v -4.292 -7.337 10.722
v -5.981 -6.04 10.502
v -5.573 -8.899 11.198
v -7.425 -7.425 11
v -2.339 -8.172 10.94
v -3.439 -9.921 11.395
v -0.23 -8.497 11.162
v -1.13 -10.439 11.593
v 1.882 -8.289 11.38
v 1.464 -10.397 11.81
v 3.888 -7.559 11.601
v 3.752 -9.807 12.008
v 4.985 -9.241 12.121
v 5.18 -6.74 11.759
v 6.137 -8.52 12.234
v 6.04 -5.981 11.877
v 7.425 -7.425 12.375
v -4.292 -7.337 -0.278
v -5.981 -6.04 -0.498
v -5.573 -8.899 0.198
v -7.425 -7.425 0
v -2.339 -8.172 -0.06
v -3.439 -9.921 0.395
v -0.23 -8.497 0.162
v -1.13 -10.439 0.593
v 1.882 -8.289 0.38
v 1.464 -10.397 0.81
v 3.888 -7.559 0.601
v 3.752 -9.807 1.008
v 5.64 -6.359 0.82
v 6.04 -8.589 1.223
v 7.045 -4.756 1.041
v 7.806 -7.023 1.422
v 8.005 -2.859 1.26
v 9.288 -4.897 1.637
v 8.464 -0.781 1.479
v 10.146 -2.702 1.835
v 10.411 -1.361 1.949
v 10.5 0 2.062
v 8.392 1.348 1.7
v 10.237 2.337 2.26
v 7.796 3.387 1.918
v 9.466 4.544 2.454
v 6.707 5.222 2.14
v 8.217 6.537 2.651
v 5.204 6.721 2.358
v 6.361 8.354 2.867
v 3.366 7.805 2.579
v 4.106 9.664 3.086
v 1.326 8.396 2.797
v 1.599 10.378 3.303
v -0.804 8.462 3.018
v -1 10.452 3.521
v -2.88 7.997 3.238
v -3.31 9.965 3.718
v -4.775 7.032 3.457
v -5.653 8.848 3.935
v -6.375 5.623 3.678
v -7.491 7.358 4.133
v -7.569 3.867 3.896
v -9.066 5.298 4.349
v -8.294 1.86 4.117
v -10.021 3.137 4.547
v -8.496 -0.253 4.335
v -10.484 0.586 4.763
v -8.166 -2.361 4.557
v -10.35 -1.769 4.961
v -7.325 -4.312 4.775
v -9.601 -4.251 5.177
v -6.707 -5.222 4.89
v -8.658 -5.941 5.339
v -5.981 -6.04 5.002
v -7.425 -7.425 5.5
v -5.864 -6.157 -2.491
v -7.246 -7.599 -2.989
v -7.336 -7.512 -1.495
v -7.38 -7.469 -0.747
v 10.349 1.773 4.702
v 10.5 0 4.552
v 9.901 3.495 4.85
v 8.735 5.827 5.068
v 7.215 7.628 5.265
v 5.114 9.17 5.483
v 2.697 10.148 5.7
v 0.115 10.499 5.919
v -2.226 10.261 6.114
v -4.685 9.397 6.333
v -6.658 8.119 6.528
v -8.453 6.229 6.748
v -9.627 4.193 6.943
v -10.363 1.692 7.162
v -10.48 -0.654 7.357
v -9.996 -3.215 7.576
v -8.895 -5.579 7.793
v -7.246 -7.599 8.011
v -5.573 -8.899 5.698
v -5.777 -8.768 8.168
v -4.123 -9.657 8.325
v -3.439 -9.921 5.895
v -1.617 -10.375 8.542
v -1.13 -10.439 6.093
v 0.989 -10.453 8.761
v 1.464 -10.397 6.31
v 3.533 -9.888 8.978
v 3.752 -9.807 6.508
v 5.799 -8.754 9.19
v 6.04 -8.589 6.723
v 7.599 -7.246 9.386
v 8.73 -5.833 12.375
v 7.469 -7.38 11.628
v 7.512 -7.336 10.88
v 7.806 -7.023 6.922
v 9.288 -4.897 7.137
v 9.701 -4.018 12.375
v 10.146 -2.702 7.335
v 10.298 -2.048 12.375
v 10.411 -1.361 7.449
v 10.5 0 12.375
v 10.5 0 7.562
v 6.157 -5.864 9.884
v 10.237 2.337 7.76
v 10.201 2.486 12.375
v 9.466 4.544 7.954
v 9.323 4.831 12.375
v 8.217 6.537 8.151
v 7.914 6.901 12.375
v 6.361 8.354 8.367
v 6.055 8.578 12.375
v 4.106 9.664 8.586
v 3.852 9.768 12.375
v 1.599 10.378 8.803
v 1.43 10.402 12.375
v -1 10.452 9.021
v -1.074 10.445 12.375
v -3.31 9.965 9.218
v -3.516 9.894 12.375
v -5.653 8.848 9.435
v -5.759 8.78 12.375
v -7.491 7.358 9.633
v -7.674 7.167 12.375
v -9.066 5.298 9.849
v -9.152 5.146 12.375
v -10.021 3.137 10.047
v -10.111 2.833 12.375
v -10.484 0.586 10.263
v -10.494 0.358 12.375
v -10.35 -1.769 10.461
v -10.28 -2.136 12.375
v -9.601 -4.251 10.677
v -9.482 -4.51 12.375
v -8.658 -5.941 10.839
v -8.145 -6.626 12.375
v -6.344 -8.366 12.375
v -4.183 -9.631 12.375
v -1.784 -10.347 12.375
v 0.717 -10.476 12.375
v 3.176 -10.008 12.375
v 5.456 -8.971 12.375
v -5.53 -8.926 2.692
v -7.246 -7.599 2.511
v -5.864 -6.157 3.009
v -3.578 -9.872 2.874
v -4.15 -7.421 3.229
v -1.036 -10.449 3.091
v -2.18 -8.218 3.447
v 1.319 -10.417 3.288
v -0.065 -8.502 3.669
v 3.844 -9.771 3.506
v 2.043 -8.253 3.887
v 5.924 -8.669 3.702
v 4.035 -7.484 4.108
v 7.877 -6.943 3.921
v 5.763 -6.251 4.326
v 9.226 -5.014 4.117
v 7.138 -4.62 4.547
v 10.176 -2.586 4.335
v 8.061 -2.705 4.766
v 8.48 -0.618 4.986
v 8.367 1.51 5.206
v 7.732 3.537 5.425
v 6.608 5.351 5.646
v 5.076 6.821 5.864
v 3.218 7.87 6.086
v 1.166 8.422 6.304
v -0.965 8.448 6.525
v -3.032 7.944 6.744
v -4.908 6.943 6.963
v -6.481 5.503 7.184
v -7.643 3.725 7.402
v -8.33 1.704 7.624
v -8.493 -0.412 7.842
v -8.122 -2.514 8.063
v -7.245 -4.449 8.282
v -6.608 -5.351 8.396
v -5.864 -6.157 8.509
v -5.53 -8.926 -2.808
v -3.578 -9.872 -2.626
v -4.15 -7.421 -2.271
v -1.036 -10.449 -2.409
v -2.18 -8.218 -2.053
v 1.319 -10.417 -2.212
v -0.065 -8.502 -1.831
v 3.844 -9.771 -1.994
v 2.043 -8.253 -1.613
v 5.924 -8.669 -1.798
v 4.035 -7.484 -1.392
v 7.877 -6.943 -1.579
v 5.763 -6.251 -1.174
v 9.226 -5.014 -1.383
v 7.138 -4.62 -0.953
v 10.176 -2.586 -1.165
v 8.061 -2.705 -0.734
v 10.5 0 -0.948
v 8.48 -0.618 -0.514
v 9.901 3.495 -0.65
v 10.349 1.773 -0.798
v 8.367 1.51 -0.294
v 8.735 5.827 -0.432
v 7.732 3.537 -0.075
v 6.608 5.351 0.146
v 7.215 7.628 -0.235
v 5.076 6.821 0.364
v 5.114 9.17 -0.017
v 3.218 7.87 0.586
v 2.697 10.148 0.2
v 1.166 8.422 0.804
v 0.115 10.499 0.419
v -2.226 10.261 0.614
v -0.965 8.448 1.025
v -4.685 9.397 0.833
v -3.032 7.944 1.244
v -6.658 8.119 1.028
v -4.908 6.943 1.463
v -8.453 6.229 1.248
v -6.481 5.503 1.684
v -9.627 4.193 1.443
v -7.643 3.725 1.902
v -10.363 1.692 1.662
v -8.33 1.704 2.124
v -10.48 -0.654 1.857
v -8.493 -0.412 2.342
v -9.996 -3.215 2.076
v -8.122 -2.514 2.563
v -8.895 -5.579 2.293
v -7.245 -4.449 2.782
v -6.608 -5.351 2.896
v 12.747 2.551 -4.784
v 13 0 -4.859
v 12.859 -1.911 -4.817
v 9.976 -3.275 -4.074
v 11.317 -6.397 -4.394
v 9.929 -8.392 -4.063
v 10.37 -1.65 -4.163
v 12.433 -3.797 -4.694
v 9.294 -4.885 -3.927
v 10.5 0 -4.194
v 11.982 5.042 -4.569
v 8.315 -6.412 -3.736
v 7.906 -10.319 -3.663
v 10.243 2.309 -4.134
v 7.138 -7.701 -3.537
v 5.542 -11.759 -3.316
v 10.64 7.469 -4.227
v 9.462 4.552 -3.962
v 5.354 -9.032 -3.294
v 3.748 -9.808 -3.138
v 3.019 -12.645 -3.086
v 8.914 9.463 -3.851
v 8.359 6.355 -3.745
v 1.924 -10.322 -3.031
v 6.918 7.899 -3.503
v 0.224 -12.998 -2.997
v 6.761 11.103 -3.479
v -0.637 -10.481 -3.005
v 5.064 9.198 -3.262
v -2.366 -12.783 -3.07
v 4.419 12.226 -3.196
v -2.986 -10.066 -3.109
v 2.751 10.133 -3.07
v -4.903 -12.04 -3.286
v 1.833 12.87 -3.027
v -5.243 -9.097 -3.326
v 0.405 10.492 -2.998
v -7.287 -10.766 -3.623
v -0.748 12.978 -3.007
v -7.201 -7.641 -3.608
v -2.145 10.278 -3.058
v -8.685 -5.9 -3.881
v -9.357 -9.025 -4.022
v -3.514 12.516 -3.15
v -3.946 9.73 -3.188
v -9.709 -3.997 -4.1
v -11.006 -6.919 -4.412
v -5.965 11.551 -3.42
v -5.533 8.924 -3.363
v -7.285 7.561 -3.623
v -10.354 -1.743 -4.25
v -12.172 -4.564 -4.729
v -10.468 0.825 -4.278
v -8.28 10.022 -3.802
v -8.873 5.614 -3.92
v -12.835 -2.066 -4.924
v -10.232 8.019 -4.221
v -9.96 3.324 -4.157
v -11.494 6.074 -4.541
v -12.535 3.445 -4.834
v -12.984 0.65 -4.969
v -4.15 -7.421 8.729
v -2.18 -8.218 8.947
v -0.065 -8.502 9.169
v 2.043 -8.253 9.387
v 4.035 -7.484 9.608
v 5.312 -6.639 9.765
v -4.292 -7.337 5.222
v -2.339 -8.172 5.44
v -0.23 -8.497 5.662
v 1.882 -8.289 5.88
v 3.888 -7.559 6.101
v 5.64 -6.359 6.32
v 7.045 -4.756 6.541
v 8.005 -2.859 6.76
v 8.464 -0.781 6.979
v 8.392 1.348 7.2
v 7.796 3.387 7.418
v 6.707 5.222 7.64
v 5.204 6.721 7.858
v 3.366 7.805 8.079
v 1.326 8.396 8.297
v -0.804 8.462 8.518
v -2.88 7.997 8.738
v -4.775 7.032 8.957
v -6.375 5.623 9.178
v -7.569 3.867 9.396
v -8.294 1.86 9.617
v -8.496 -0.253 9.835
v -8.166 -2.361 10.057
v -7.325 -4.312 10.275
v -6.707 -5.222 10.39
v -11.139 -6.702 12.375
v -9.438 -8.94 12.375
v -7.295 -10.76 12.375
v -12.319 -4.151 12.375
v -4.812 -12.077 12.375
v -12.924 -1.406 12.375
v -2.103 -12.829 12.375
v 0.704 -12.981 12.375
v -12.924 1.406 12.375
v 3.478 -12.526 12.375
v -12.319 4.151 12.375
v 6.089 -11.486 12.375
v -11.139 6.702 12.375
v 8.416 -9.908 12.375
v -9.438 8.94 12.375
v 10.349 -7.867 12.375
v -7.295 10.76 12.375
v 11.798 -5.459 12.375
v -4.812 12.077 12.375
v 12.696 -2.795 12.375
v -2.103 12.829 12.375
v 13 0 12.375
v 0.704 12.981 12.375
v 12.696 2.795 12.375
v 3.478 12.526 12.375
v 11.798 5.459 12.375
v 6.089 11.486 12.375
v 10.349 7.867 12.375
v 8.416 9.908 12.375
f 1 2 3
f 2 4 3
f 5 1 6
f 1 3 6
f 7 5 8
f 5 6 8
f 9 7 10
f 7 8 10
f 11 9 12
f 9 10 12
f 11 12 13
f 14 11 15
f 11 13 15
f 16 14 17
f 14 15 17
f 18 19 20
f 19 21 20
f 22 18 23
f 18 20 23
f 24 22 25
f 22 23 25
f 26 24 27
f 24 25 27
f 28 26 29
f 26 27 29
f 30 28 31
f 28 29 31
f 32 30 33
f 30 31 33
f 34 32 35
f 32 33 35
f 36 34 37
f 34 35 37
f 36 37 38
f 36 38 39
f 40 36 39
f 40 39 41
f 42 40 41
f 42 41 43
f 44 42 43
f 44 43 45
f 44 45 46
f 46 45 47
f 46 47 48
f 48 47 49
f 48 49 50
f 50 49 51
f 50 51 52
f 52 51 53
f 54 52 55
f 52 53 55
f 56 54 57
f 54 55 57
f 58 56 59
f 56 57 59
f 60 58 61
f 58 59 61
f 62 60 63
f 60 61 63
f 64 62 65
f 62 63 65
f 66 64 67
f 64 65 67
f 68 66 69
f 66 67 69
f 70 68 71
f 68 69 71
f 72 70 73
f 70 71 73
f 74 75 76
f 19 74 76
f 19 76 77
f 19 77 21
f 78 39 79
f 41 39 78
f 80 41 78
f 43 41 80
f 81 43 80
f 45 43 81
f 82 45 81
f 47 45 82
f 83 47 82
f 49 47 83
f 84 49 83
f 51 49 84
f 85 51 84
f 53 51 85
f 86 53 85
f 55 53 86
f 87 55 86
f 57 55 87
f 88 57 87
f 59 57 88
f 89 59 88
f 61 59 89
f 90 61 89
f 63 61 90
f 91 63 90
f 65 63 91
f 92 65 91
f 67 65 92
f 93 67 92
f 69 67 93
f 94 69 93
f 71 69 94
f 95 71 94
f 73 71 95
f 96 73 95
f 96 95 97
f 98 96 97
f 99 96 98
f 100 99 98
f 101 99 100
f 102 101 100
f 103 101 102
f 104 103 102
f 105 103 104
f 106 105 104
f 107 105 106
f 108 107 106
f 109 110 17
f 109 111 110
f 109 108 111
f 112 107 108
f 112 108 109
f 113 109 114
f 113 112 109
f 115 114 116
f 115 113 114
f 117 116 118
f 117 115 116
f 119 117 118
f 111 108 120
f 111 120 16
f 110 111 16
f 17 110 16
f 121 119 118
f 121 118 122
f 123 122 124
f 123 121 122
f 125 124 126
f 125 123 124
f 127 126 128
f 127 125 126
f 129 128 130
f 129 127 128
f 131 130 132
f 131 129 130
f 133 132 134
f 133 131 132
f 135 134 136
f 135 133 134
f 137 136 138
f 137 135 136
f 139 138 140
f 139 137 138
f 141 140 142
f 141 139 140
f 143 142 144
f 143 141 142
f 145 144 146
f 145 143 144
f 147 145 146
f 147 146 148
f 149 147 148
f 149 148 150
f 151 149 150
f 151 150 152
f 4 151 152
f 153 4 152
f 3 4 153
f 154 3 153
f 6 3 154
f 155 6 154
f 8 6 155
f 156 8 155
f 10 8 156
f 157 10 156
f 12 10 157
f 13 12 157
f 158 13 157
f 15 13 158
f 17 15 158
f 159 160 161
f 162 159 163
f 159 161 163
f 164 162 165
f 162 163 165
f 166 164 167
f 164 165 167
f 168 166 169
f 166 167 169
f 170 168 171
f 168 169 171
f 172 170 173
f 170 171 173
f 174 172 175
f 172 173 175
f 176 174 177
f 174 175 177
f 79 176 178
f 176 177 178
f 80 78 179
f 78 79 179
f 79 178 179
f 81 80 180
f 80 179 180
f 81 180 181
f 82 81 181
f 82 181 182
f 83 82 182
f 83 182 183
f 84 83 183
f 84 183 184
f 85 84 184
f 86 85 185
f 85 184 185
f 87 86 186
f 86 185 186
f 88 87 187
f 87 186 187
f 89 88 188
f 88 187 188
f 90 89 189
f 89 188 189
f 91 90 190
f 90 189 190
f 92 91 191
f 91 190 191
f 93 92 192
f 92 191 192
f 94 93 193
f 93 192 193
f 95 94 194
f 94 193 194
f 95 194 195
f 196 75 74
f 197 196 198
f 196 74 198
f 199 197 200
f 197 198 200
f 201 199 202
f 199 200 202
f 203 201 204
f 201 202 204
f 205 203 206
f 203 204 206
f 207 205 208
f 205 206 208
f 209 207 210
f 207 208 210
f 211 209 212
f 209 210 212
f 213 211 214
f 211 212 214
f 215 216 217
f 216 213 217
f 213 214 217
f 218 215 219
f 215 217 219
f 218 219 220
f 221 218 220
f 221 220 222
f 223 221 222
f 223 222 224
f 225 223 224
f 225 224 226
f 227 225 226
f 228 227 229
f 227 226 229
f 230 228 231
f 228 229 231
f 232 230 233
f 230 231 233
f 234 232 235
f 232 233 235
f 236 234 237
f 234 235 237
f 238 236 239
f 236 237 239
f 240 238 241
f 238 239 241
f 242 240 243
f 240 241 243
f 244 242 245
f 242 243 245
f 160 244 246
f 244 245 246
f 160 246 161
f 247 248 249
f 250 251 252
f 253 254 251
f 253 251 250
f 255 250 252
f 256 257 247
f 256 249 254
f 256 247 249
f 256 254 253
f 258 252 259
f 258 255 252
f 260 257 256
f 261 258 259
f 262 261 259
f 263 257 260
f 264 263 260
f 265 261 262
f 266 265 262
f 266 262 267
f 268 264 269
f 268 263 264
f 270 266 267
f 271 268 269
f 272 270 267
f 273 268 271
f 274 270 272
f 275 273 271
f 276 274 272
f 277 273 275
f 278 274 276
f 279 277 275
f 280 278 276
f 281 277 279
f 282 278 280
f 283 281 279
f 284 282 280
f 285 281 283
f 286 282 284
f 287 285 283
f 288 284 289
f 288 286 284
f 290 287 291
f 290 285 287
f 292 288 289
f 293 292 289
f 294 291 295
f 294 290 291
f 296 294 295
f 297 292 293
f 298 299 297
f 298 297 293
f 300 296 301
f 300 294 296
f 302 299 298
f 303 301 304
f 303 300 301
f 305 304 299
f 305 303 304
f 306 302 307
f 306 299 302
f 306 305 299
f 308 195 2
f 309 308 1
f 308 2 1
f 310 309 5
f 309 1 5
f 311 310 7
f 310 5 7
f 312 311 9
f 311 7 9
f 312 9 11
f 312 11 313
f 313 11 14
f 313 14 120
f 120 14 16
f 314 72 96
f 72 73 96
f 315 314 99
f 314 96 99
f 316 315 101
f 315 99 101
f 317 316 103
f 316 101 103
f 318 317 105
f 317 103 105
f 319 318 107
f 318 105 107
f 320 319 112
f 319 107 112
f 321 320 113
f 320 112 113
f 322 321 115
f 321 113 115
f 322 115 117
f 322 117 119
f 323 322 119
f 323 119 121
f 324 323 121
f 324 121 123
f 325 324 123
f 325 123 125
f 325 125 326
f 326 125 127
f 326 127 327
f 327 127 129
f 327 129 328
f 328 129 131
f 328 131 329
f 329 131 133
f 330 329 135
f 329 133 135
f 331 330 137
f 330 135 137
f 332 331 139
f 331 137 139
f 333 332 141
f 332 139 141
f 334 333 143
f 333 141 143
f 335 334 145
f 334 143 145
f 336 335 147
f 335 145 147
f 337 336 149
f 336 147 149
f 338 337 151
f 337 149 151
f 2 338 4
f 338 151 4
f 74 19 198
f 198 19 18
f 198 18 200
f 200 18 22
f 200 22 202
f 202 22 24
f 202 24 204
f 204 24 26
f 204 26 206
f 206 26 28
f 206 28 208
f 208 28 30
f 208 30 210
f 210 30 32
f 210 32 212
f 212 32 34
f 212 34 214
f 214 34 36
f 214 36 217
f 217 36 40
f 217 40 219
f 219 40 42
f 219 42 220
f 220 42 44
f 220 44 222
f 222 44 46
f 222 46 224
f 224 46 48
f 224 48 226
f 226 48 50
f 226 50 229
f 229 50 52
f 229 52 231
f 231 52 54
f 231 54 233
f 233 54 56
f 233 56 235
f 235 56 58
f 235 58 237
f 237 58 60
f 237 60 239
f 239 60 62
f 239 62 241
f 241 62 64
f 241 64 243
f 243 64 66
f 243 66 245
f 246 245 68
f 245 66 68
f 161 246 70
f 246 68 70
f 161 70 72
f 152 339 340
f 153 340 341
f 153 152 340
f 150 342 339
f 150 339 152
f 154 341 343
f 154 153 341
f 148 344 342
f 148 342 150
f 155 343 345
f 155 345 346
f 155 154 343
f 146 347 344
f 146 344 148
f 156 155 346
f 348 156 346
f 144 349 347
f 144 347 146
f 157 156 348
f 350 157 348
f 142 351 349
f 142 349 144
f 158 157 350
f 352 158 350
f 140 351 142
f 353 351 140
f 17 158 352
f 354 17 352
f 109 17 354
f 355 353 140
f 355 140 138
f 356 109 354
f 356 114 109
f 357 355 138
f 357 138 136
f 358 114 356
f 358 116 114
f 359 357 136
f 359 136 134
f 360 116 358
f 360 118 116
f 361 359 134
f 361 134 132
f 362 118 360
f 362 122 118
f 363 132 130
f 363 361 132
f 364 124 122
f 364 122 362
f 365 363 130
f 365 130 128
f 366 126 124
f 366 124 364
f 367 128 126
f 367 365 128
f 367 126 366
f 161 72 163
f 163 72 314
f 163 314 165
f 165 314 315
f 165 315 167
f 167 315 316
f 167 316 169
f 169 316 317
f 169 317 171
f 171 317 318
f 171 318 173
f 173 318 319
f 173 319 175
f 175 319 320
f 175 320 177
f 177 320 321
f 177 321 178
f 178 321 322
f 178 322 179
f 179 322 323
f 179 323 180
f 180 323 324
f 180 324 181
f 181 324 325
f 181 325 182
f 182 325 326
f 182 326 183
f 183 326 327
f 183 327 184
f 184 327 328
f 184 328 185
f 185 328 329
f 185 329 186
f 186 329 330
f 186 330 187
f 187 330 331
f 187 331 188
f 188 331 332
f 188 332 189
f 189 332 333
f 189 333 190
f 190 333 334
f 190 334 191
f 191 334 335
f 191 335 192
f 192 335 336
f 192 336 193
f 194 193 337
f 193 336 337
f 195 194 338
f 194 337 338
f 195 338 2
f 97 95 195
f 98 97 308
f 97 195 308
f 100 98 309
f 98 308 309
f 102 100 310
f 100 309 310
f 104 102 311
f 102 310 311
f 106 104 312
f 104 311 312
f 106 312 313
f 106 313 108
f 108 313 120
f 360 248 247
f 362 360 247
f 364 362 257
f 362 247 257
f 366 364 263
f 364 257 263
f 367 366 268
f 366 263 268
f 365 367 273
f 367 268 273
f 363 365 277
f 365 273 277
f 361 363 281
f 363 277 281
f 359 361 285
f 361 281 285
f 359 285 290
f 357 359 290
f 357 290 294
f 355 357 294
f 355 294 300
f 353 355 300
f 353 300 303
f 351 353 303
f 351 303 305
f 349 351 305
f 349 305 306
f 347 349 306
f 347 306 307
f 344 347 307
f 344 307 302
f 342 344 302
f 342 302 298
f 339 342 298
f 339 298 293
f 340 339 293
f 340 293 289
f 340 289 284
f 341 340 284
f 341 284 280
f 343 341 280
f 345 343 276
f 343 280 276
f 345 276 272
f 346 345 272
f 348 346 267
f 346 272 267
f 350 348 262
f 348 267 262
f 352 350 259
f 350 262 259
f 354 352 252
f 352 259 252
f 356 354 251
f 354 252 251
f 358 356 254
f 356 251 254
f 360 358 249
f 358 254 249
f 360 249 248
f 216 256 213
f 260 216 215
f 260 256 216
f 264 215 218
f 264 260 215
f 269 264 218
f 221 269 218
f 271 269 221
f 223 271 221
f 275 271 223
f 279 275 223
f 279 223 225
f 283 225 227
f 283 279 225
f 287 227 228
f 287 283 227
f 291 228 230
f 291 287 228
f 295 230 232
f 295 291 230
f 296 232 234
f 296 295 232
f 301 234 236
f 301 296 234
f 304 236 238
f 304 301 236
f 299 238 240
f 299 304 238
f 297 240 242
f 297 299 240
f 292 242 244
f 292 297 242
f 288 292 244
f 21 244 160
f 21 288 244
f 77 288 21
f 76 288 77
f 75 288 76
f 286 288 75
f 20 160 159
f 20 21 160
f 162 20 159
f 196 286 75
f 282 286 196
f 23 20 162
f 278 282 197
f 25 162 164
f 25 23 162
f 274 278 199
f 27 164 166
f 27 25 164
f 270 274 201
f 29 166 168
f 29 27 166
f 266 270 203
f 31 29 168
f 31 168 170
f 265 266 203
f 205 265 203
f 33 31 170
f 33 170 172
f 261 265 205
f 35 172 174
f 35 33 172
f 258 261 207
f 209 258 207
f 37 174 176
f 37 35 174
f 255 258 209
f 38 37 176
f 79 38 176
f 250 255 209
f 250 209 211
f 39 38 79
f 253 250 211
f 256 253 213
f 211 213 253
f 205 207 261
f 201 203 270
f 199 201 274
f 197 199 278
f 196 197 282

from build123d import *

# Parameters (mm, degrees)
EXTRUDE_1_DEPTH          = 12.375
EXTRUDE_1_DEPTH_BACK     = 13
SKETCH_1_R               = 13
CUT_EXTRUDE_1_DEPTH      = 20
CUT_EXTRUDE_1_DEPTH_BACK = 10
SKETCH_2_R               = 10.5
SWEEP_1_PITCH            = 5.5
CUT_EXTRUDE_2_DEPTH      = 20
CUT_EXTRUDE_2_DEPTH_BACK = 20
SKETCH_6_R               = 45.002821291


with BuildPart() as part:
    # 草图1 → 凸台-拉伸1 (new, two sides: drawn at the far end of the back side and taken through both)
    with BuildSketch(Plane.XY.offset(-EXTRUDE_1_DEPTH_BACK)):
        Circle(SKETCH_1_R)
    extrude(amount=EXTRUDE_1_DEPTH + EXTRUDE_1_DEPTH_BACK)

    # 草图2 → 切除-拉伸1 (cut, two sides: drawn at the far end of the back side and taken through both)
    with BuildSketch(Plane.XY.offset(-CUT_EXTRUDE_1_DEPTH_BACK)):
        Circle(SKETCH_2_R)
    extrude(amount=CUT_EXTRUDE_1_DEPTH + CUT_EXTRUDE_1_DEPTH_BACK, mode=Mode.SUBTRACT)

    # 扫描1: the profile of 草图4 screwed along a right-hand helix of 2.25 turns, 14 arcs to a turn; built about Z, then put on its axis
    sweep_1_z = Axis((0, 0, 0), (0, 0, 1))
    sweep_1_corners = [(10.5, 0, 0), (10.5, 0.249236025, -2.989628974), (8.5, 0.207696687, -2.491357479), (8.5, 0.041539337, -0.498271496)]
    with BuildLine(mode=Mode.PRIVATE) as sweep_1_profile:
        Line(sweep_1_corners[0], sweep_1_corners[1])
        Line(sweep_1_corners[1], sweep_1_corners[2])
        Line(sweep_1_corners[2], sweep_1_corners[3])
        Line(sweep_1_corners[3], sweep_1_corners[0])
    sweep_1_cap = Face(sweep_1_profile.wire())
    sweep_1_turn_angles = [0, 12.857142857, 25.714285714, 38.571428571, 51.428571429, 64.285714286, 77.142857143, 90, 102.857142857, 115.714285714, 128.571428571, 141.428571429, 154.285714286, 167.142857143, 180, 192.857142857, 205.714285714, 218.571428571, 231.428571429, 244.285714286, 257.142857143, 270, 282.857142857, 295.714285714, 308.571428571, 321.428571429, 334.285714286, 347.142857143, 360]
    sweep_1_turn_weights = [1, 0.9749279121818236, 1, 0.9749279121818236, 1, 0.9749279121818236, 1, 0.9749279121818236, 1, 0.9749279121818236, 1, 0.9749279121818236, 1, 0.9749279121818236, 1, 0.9749279121818236, 1, 0.9749279121818236, 1, 0.9749279121818236, 1, 0.9749279121818236, 1, 0.9749279121818237, 1, 0.9749279121818236, 1, 0.9749279121818236, 1]
    sweep_1_turn_rails = [Edge.make_bspline([Vector(p[0], p[1], 0).rotate(sweep_1_z, sweep_1_turn_angles[k]) / sweep_1_turn_weights[k] + Vector(0, 0, p[2] + SWEEP_1_PITCH * sweep_1_turn_angles[k] / 360) for k in range(29)], [0, 0, 0, 1, 1, 2, 2, 3, 3, 4, 4, 5, 5, 6, 6, 7, 7, 8, 8, 9, 9, 10, 10, 11, 11, 12, 12, 13, 13, 14, 14, 14], 2, sweep_1_turn_weights) for p in sweep_1_corners]
    sweep_1_turn_sides = [Face.make_surface_from_curves(sweep_1_turn_rails[p[0]], sweep_1_turn_rails[p[1]]) for p in [(0, 1), (1, 2), (2, 3), (3, 0)]]
    sweep_1_last_angles = [720, 732.857142857, 745.714285714, 758.571428571, 771.428571429, 784.285714286, 797.142857143, 803.571428571, 810]
    sweep_1_last_weights = [1, 0.9749279121818237, 1, 0.9749279121818235, 1, 0.9749279121818237, 1, 0.9937122098932412, 1]
    sweep_1_last_rails = [Edge.make_bspline([Vector(p[0], p[1], 0).rotate(sweep_1_z, sweep_1_last_angles[k]) / sweep_1_last_weights[k] + Vector(0, 0, p[2] + SWEEP_1_PITCH * sweep_1_last_angles[k] / 360) for k in range(9)], [0, 0, 0, 1, 1, 2, 2, 3, 3, 4, 4, 4], 2, sweep_1_last_weights) for p in sweep_1_corners]
    sweep_1_last_sides = [Face.make_surface_from_curves(sweep_1_last_rails[p[0]], sweep_1_last_rails[p[1]]) for p in [(0, 1), (1, 2), (2, 3), (3, 0)]]
    sweep_1 = Plane(origin=(0, 0, 0), x_dir=(-0.7071067811865414, -0.7071067811865537, 0), z_dir=(0, 0, 1)) * Solid(Shell([*[p.moved(Location((0, 0, SWEEP_1_PITCH * i))) for i in range(2) for p in sweep_1_turn_sides], *sweep_1_last_sides, sweep_1_cap, sweep_1_cap.rotate(sweep_1_z, 810).moved(Location((0, 0, SWEEP_1_PITCH * 810 / 360)))]))
    add(sweep_1)

    # 草图6 → 切除-拉伸2 (cut, two sides: drawn at the far end of the back side and taken through both)
    with BuildSketch(Plane(origin=(0, 0, 0), x_dir=(-1, 0, 0), z_dir=(0, -1, 0)).offset(-CUT_EXTRUDE_2_DEPTH_BACK)):
        with Locations((-0.191121104, 48)):
            Circle(SKETCH_6_R)
    extrude(amount=CUT_EXTRUDE_2_DEPTH + CUT_EXTRUDE_2_DEPTH_BACK, mode=Mode.SUBTRACT)


solid = part.part
